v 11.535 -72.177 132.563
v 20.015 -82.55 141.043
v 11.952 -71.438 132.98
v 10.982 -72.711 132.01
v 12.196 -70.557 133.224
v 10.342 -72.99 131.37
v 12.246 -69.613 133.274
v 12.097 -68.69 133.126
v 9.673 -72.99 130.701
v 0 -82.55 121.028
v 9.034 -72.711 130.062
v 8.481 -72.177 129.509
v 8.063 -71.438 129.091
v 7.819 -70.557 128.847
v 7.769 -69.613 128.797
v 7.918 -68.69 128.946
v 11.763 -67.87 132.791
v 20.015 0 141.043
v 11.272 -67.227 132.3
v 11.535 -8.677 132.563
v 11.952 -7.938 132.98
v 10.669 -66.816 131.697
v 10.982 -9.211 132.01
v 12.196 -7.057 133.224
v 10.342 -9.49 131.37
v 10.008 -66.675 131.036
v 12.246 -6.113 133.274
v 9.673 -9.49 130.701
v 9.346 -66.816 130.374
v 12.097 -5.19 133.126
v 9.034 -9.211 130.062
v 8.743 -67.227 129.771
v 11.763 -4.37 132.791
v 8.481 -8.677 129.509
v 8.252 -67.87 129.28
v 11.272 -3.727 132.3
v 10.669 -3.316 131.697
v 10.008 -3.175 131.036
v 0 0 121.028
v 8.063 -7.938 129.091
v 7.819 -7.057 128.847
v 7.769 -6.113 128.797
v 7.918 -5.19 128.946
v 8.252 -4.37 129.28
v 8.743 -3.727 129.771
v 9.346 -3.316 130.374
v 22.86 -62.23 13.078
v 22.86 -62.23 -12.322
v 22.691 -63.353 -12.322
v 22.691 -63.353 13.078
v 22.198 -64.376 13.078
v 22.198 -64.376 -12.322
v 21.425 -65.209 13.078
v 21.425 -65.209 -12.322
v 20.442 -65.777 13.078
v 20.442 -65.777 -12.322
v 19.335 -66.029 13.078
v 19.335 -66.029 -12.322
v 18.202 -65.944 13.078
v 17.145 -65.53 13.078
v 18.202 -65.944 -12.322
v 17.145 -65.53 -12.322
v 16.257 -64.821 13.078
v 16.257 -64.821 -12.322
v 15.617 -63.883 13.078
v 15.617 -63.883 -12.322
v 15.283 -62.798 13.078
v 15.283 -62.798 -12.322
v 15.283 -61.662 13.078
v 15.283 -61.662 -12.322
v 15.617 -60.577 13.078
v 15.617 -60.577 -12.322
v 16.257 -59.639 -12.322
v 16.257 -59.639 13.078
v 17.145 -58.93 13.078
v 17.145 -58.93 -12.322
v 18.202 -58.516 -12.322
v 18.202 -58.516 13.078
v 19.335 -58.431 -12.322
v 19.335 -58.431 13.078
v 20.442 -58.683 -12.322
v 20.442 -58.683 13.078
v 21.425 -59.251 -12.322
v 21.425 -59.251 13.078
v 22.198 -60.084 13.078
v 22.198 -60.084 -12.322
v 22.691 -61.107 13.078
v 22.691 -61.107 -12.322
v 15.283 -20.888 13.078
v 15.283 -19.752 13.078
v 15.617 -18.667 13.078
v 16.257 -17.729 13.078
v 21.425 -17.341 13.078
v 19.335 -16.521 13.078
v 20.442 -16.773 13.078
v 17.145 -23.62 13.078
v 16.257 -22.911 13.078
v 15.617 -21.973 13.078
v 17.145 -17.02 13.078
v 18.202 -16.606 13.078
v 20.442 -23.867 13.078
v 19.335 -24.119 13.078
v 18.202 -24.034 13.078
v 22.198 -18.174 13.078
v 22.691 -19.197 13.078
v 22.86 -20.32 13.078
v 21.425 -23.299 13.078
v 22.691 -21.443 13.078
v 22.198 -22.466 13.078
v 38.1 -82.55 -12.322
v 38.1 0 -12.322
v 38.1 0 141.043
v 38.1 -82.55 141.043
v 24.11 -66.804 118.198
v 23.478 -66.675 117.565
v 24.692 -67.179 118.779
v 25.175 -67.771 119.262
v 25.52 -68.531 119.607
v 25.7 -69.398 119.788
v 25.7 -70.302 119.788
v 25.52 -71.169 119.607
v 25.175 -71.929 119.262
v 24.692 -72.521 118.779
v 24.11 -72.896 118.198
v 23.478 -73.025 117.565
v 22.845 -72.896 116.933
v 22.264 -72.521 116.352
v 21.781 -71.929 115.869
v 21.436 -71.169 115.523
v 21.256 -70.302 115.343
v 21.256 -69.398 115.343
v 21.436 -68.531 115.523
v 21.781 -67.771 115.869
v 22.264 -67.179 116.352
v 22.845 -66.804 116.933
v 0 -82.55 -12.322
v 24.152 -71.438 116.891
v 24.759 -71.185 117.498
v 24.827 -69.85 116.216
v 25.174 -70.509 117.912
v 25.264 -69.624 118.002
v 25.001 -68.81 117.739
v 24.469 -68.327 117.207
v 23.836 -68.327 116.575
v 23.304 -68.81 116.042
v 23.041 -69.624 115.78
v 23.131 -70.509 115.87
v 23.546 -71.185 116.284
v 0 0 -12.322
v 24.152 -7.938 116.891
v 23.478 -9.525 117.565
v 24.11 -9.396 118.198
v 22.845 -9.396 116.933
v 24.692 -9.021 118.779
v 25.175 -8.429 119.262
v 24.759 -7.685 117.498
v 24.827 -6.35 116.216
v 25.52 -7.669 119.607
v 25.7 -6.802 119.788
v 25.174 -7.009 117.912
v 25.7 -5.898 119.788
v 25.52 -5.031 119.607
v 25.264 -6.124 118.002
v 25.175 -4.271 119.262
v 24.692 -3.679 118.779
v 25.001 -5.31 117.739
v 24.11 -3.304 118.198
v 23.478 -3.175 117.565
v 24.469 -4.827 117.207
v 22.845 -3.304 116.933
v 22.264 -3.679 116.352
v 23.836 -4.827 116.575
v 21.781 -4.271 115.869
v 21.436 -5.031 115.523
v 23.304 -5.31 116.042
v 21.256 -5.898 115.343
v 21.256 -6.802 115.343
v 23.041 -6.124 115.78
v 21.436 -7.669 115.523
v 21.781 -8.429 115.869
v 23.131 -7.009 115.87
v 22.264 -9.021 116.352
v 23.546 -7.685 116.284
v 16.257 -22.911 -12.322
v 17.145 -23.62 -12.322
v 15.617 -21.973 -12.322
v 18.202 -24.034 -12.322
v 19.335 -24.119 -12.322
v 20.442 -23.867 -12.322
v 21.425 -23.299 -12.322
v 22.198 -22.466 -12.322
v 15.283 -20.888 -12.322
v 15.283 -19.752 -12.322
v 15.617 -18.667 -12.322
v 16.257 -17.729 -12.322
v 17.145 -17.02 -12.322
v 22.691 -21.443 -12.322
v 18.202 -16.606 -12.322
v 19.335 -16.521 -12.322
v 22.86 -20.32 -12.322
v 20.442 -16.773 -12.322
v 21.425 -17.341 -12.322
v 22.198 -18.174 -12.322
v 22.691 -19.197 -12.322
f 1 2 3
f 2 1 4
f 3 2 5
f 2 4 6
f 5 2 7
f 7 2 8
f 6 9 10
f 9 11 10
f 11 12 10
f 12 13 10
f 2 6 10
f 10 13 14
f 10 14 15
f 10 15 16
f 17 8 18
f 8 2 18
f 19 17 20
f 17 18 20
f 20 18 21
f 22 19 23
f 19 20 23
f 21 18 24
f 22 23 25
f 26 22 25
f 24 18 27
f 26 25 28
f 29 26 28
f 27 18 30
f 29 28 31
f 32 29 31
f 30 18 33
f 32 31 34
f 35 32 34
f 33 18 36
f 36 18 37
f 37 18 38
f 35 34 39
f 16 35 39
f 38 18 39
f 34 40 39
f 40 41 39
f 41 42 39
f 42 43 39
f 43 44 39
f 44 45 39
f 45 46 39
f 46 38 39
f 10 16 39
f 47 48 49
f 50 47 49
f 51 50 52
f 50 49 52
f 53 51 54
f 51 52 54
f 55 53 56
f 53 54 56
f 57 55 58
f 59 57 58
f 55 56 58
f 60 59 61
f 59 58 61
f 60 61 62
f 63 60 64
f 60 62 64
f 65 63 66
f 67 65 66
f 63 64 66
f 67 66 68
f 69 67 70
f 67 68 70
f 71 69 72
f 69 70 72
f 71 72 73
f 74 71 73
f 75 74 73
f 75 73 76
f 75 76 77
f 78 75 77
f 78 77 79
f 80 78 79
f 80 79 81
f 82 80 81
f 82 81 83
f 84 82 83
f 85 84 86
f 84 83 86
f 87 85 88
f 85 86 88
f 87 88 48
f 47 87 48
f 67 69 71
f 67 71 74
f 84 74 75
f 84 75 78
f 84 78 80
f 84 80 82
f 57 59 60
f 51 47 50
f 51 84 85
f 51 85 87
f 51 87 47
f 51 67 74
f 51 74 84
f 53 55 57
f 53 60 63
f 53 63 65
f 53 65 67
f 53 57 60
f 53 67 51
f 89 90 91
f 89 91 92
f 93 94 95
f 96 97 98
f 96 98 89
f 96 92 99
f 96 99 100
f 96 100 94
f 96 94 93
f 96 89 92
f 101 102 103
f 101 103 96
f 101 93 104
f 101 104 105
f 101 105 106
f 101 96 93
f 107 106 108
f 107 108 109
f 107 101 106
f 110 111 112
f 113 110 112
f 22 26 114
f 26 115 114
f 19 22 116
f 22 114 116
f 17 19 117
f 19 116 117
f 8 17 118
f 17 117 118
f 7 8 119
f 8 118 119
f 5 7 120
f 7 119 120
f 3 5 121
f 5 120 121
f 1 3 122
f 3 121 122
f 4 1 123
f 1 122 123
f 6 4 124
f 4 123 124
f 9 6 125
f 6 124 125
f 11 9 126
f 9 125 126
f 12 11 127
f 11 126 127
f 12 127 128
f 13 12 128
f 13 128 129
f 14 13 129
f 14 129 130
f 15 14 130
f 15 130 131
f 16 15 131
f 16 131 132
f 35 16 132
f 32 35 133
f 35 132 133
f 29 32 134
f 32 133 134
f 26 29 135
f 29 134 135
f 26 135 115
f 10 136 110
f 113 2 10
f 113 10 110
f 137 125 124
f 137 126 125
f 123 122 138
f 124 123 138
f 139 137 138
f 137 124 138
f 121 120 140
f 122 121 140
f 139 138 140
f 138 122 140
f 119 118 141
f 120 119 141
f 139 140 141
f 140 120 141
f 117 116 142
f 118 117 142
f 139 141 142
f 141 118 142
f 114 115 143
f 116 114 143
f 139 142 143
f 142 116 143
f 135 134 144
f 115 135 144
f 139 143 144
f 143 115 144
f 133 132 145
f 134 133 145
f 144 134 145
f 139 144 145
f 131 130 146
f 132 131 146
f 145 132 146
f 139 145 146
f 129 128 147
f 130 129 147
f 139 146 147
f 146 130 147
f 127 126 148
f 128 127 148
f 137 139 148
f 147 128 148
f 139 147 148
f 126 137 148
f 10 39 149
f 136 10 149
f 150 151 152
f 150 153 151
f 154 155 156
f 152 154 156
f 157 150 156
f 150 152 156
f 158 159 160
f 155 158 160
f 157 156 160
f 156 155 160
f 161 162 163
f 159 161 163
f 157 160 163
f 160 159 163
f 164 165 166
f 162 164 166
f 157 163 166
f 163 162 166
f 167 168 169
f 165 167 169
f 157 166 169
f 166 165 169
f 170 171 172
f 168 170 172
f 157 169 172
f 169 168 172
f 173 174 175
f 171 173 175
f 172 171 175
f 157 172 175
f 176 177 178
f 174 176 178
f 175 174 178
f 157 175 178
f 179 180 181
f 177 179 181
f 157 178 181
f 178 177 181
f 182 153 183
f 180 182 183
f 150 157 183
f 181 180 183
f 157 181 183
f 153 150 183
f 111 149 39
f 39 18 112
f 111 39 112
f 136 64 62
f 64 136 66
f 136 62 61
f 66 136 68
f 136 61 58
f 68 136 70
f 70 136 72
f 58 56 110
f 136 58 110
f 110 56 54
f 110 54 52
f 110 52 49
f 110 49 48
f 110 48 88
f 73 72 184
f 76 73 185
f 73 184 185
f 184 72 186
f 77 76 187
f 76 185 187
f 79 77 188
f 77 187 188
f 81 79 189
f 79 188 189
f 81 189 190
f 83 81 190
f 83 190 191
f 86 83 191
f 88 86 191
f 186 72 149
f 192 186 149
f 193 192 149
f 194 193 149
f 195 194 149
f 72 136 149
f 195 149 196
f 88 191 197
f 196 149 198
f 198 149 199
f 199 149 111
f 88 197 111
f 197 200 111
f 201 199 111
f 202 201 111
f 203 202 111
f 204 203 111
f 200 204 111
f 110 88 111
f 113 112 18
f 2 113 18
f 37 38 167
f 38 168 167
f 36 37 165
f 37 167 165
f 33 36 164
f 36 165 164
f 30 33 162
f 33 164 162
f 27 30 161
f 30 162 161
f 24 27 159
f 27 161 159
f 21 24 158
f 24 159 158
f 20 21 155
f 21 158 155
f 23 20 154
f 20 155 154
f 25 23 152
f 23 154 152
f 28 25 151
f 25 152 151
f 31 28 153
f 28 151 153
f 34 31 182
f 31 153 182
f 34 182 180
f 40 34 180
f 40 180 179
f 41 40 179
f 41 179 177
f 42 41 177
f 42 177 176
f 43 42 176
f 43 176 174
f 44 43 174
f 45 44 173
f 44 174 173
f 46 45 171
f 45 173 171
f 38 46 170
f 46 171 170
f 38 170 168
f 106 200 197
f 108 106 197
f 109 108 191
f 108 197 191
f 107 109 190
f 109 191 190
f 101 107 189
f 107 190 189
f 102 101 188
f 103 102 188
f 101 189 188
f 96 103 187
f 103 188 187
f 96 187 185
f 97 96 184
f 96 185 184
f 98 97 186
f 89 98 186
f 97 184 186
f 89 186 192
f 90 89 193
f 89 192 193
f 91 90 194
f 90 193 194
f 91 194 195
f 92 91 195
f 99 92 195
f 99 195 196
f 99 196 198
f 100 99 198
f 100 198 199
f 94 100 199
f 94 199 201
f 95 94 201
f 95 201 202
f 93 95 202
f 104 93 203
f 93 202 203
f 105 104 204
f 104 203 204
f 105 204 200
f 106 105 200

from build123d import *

# Parameters (mm, degrees)
F1_DEPTH = 82.55
F2_R     = 3.81
F3_DEPTH = 25.4
F5_D     = 6.35
F5_DEPTH = 19.05
F5_TIP   = 1.9077324654


with BuildPart() as f1:
    # F0 (on Front) → F1 (new body)
    with BuildSketch(Plane.XZ):
        Polygon((0, 121.0280880332), (0, -12.3219119668), (38.1, -12.3219119668), (38.1, 141.0432880332), (20.0152, 141.0432880332), align=None)
    extrude(amount=F1_DEPTH)

    # F2 (on face) → F3 (cut)
    with BuildSketch(Plane(origin=(0, 0, -12.3219119668), x_dir=(1, 0, 0), z_dir=(0, 0, -1))):
        with Locations((19.05, 62.23)):
            Circle(F2_R)
        with Locations((19.05, 20.32)):
            Circle(F2_R)
    extrude(amount=-F3_DEPTH, mode=Mode.SUBTRACT)

    # F5
    with Locations(Plane(origin=(-60.5140440166, 0, 60.5140440166), x_dir=(0, -1, 0), z_dir=(-0.7071067812, 0, 0.7071067812))):
        with Locations((6.35, 99.7326654091), (69.85, 99.7326654091)):
            Hole(F5_D / 2, depth=F5_DEPTH)
            with Locations((0, 0, -(F5_DEPTH + F5_TIP / 2))):  # 118° drill point
                Cone(0, F5_D / 2, F5_TIP, mode=Mode.SUBTRACT)


solid = f1.part
